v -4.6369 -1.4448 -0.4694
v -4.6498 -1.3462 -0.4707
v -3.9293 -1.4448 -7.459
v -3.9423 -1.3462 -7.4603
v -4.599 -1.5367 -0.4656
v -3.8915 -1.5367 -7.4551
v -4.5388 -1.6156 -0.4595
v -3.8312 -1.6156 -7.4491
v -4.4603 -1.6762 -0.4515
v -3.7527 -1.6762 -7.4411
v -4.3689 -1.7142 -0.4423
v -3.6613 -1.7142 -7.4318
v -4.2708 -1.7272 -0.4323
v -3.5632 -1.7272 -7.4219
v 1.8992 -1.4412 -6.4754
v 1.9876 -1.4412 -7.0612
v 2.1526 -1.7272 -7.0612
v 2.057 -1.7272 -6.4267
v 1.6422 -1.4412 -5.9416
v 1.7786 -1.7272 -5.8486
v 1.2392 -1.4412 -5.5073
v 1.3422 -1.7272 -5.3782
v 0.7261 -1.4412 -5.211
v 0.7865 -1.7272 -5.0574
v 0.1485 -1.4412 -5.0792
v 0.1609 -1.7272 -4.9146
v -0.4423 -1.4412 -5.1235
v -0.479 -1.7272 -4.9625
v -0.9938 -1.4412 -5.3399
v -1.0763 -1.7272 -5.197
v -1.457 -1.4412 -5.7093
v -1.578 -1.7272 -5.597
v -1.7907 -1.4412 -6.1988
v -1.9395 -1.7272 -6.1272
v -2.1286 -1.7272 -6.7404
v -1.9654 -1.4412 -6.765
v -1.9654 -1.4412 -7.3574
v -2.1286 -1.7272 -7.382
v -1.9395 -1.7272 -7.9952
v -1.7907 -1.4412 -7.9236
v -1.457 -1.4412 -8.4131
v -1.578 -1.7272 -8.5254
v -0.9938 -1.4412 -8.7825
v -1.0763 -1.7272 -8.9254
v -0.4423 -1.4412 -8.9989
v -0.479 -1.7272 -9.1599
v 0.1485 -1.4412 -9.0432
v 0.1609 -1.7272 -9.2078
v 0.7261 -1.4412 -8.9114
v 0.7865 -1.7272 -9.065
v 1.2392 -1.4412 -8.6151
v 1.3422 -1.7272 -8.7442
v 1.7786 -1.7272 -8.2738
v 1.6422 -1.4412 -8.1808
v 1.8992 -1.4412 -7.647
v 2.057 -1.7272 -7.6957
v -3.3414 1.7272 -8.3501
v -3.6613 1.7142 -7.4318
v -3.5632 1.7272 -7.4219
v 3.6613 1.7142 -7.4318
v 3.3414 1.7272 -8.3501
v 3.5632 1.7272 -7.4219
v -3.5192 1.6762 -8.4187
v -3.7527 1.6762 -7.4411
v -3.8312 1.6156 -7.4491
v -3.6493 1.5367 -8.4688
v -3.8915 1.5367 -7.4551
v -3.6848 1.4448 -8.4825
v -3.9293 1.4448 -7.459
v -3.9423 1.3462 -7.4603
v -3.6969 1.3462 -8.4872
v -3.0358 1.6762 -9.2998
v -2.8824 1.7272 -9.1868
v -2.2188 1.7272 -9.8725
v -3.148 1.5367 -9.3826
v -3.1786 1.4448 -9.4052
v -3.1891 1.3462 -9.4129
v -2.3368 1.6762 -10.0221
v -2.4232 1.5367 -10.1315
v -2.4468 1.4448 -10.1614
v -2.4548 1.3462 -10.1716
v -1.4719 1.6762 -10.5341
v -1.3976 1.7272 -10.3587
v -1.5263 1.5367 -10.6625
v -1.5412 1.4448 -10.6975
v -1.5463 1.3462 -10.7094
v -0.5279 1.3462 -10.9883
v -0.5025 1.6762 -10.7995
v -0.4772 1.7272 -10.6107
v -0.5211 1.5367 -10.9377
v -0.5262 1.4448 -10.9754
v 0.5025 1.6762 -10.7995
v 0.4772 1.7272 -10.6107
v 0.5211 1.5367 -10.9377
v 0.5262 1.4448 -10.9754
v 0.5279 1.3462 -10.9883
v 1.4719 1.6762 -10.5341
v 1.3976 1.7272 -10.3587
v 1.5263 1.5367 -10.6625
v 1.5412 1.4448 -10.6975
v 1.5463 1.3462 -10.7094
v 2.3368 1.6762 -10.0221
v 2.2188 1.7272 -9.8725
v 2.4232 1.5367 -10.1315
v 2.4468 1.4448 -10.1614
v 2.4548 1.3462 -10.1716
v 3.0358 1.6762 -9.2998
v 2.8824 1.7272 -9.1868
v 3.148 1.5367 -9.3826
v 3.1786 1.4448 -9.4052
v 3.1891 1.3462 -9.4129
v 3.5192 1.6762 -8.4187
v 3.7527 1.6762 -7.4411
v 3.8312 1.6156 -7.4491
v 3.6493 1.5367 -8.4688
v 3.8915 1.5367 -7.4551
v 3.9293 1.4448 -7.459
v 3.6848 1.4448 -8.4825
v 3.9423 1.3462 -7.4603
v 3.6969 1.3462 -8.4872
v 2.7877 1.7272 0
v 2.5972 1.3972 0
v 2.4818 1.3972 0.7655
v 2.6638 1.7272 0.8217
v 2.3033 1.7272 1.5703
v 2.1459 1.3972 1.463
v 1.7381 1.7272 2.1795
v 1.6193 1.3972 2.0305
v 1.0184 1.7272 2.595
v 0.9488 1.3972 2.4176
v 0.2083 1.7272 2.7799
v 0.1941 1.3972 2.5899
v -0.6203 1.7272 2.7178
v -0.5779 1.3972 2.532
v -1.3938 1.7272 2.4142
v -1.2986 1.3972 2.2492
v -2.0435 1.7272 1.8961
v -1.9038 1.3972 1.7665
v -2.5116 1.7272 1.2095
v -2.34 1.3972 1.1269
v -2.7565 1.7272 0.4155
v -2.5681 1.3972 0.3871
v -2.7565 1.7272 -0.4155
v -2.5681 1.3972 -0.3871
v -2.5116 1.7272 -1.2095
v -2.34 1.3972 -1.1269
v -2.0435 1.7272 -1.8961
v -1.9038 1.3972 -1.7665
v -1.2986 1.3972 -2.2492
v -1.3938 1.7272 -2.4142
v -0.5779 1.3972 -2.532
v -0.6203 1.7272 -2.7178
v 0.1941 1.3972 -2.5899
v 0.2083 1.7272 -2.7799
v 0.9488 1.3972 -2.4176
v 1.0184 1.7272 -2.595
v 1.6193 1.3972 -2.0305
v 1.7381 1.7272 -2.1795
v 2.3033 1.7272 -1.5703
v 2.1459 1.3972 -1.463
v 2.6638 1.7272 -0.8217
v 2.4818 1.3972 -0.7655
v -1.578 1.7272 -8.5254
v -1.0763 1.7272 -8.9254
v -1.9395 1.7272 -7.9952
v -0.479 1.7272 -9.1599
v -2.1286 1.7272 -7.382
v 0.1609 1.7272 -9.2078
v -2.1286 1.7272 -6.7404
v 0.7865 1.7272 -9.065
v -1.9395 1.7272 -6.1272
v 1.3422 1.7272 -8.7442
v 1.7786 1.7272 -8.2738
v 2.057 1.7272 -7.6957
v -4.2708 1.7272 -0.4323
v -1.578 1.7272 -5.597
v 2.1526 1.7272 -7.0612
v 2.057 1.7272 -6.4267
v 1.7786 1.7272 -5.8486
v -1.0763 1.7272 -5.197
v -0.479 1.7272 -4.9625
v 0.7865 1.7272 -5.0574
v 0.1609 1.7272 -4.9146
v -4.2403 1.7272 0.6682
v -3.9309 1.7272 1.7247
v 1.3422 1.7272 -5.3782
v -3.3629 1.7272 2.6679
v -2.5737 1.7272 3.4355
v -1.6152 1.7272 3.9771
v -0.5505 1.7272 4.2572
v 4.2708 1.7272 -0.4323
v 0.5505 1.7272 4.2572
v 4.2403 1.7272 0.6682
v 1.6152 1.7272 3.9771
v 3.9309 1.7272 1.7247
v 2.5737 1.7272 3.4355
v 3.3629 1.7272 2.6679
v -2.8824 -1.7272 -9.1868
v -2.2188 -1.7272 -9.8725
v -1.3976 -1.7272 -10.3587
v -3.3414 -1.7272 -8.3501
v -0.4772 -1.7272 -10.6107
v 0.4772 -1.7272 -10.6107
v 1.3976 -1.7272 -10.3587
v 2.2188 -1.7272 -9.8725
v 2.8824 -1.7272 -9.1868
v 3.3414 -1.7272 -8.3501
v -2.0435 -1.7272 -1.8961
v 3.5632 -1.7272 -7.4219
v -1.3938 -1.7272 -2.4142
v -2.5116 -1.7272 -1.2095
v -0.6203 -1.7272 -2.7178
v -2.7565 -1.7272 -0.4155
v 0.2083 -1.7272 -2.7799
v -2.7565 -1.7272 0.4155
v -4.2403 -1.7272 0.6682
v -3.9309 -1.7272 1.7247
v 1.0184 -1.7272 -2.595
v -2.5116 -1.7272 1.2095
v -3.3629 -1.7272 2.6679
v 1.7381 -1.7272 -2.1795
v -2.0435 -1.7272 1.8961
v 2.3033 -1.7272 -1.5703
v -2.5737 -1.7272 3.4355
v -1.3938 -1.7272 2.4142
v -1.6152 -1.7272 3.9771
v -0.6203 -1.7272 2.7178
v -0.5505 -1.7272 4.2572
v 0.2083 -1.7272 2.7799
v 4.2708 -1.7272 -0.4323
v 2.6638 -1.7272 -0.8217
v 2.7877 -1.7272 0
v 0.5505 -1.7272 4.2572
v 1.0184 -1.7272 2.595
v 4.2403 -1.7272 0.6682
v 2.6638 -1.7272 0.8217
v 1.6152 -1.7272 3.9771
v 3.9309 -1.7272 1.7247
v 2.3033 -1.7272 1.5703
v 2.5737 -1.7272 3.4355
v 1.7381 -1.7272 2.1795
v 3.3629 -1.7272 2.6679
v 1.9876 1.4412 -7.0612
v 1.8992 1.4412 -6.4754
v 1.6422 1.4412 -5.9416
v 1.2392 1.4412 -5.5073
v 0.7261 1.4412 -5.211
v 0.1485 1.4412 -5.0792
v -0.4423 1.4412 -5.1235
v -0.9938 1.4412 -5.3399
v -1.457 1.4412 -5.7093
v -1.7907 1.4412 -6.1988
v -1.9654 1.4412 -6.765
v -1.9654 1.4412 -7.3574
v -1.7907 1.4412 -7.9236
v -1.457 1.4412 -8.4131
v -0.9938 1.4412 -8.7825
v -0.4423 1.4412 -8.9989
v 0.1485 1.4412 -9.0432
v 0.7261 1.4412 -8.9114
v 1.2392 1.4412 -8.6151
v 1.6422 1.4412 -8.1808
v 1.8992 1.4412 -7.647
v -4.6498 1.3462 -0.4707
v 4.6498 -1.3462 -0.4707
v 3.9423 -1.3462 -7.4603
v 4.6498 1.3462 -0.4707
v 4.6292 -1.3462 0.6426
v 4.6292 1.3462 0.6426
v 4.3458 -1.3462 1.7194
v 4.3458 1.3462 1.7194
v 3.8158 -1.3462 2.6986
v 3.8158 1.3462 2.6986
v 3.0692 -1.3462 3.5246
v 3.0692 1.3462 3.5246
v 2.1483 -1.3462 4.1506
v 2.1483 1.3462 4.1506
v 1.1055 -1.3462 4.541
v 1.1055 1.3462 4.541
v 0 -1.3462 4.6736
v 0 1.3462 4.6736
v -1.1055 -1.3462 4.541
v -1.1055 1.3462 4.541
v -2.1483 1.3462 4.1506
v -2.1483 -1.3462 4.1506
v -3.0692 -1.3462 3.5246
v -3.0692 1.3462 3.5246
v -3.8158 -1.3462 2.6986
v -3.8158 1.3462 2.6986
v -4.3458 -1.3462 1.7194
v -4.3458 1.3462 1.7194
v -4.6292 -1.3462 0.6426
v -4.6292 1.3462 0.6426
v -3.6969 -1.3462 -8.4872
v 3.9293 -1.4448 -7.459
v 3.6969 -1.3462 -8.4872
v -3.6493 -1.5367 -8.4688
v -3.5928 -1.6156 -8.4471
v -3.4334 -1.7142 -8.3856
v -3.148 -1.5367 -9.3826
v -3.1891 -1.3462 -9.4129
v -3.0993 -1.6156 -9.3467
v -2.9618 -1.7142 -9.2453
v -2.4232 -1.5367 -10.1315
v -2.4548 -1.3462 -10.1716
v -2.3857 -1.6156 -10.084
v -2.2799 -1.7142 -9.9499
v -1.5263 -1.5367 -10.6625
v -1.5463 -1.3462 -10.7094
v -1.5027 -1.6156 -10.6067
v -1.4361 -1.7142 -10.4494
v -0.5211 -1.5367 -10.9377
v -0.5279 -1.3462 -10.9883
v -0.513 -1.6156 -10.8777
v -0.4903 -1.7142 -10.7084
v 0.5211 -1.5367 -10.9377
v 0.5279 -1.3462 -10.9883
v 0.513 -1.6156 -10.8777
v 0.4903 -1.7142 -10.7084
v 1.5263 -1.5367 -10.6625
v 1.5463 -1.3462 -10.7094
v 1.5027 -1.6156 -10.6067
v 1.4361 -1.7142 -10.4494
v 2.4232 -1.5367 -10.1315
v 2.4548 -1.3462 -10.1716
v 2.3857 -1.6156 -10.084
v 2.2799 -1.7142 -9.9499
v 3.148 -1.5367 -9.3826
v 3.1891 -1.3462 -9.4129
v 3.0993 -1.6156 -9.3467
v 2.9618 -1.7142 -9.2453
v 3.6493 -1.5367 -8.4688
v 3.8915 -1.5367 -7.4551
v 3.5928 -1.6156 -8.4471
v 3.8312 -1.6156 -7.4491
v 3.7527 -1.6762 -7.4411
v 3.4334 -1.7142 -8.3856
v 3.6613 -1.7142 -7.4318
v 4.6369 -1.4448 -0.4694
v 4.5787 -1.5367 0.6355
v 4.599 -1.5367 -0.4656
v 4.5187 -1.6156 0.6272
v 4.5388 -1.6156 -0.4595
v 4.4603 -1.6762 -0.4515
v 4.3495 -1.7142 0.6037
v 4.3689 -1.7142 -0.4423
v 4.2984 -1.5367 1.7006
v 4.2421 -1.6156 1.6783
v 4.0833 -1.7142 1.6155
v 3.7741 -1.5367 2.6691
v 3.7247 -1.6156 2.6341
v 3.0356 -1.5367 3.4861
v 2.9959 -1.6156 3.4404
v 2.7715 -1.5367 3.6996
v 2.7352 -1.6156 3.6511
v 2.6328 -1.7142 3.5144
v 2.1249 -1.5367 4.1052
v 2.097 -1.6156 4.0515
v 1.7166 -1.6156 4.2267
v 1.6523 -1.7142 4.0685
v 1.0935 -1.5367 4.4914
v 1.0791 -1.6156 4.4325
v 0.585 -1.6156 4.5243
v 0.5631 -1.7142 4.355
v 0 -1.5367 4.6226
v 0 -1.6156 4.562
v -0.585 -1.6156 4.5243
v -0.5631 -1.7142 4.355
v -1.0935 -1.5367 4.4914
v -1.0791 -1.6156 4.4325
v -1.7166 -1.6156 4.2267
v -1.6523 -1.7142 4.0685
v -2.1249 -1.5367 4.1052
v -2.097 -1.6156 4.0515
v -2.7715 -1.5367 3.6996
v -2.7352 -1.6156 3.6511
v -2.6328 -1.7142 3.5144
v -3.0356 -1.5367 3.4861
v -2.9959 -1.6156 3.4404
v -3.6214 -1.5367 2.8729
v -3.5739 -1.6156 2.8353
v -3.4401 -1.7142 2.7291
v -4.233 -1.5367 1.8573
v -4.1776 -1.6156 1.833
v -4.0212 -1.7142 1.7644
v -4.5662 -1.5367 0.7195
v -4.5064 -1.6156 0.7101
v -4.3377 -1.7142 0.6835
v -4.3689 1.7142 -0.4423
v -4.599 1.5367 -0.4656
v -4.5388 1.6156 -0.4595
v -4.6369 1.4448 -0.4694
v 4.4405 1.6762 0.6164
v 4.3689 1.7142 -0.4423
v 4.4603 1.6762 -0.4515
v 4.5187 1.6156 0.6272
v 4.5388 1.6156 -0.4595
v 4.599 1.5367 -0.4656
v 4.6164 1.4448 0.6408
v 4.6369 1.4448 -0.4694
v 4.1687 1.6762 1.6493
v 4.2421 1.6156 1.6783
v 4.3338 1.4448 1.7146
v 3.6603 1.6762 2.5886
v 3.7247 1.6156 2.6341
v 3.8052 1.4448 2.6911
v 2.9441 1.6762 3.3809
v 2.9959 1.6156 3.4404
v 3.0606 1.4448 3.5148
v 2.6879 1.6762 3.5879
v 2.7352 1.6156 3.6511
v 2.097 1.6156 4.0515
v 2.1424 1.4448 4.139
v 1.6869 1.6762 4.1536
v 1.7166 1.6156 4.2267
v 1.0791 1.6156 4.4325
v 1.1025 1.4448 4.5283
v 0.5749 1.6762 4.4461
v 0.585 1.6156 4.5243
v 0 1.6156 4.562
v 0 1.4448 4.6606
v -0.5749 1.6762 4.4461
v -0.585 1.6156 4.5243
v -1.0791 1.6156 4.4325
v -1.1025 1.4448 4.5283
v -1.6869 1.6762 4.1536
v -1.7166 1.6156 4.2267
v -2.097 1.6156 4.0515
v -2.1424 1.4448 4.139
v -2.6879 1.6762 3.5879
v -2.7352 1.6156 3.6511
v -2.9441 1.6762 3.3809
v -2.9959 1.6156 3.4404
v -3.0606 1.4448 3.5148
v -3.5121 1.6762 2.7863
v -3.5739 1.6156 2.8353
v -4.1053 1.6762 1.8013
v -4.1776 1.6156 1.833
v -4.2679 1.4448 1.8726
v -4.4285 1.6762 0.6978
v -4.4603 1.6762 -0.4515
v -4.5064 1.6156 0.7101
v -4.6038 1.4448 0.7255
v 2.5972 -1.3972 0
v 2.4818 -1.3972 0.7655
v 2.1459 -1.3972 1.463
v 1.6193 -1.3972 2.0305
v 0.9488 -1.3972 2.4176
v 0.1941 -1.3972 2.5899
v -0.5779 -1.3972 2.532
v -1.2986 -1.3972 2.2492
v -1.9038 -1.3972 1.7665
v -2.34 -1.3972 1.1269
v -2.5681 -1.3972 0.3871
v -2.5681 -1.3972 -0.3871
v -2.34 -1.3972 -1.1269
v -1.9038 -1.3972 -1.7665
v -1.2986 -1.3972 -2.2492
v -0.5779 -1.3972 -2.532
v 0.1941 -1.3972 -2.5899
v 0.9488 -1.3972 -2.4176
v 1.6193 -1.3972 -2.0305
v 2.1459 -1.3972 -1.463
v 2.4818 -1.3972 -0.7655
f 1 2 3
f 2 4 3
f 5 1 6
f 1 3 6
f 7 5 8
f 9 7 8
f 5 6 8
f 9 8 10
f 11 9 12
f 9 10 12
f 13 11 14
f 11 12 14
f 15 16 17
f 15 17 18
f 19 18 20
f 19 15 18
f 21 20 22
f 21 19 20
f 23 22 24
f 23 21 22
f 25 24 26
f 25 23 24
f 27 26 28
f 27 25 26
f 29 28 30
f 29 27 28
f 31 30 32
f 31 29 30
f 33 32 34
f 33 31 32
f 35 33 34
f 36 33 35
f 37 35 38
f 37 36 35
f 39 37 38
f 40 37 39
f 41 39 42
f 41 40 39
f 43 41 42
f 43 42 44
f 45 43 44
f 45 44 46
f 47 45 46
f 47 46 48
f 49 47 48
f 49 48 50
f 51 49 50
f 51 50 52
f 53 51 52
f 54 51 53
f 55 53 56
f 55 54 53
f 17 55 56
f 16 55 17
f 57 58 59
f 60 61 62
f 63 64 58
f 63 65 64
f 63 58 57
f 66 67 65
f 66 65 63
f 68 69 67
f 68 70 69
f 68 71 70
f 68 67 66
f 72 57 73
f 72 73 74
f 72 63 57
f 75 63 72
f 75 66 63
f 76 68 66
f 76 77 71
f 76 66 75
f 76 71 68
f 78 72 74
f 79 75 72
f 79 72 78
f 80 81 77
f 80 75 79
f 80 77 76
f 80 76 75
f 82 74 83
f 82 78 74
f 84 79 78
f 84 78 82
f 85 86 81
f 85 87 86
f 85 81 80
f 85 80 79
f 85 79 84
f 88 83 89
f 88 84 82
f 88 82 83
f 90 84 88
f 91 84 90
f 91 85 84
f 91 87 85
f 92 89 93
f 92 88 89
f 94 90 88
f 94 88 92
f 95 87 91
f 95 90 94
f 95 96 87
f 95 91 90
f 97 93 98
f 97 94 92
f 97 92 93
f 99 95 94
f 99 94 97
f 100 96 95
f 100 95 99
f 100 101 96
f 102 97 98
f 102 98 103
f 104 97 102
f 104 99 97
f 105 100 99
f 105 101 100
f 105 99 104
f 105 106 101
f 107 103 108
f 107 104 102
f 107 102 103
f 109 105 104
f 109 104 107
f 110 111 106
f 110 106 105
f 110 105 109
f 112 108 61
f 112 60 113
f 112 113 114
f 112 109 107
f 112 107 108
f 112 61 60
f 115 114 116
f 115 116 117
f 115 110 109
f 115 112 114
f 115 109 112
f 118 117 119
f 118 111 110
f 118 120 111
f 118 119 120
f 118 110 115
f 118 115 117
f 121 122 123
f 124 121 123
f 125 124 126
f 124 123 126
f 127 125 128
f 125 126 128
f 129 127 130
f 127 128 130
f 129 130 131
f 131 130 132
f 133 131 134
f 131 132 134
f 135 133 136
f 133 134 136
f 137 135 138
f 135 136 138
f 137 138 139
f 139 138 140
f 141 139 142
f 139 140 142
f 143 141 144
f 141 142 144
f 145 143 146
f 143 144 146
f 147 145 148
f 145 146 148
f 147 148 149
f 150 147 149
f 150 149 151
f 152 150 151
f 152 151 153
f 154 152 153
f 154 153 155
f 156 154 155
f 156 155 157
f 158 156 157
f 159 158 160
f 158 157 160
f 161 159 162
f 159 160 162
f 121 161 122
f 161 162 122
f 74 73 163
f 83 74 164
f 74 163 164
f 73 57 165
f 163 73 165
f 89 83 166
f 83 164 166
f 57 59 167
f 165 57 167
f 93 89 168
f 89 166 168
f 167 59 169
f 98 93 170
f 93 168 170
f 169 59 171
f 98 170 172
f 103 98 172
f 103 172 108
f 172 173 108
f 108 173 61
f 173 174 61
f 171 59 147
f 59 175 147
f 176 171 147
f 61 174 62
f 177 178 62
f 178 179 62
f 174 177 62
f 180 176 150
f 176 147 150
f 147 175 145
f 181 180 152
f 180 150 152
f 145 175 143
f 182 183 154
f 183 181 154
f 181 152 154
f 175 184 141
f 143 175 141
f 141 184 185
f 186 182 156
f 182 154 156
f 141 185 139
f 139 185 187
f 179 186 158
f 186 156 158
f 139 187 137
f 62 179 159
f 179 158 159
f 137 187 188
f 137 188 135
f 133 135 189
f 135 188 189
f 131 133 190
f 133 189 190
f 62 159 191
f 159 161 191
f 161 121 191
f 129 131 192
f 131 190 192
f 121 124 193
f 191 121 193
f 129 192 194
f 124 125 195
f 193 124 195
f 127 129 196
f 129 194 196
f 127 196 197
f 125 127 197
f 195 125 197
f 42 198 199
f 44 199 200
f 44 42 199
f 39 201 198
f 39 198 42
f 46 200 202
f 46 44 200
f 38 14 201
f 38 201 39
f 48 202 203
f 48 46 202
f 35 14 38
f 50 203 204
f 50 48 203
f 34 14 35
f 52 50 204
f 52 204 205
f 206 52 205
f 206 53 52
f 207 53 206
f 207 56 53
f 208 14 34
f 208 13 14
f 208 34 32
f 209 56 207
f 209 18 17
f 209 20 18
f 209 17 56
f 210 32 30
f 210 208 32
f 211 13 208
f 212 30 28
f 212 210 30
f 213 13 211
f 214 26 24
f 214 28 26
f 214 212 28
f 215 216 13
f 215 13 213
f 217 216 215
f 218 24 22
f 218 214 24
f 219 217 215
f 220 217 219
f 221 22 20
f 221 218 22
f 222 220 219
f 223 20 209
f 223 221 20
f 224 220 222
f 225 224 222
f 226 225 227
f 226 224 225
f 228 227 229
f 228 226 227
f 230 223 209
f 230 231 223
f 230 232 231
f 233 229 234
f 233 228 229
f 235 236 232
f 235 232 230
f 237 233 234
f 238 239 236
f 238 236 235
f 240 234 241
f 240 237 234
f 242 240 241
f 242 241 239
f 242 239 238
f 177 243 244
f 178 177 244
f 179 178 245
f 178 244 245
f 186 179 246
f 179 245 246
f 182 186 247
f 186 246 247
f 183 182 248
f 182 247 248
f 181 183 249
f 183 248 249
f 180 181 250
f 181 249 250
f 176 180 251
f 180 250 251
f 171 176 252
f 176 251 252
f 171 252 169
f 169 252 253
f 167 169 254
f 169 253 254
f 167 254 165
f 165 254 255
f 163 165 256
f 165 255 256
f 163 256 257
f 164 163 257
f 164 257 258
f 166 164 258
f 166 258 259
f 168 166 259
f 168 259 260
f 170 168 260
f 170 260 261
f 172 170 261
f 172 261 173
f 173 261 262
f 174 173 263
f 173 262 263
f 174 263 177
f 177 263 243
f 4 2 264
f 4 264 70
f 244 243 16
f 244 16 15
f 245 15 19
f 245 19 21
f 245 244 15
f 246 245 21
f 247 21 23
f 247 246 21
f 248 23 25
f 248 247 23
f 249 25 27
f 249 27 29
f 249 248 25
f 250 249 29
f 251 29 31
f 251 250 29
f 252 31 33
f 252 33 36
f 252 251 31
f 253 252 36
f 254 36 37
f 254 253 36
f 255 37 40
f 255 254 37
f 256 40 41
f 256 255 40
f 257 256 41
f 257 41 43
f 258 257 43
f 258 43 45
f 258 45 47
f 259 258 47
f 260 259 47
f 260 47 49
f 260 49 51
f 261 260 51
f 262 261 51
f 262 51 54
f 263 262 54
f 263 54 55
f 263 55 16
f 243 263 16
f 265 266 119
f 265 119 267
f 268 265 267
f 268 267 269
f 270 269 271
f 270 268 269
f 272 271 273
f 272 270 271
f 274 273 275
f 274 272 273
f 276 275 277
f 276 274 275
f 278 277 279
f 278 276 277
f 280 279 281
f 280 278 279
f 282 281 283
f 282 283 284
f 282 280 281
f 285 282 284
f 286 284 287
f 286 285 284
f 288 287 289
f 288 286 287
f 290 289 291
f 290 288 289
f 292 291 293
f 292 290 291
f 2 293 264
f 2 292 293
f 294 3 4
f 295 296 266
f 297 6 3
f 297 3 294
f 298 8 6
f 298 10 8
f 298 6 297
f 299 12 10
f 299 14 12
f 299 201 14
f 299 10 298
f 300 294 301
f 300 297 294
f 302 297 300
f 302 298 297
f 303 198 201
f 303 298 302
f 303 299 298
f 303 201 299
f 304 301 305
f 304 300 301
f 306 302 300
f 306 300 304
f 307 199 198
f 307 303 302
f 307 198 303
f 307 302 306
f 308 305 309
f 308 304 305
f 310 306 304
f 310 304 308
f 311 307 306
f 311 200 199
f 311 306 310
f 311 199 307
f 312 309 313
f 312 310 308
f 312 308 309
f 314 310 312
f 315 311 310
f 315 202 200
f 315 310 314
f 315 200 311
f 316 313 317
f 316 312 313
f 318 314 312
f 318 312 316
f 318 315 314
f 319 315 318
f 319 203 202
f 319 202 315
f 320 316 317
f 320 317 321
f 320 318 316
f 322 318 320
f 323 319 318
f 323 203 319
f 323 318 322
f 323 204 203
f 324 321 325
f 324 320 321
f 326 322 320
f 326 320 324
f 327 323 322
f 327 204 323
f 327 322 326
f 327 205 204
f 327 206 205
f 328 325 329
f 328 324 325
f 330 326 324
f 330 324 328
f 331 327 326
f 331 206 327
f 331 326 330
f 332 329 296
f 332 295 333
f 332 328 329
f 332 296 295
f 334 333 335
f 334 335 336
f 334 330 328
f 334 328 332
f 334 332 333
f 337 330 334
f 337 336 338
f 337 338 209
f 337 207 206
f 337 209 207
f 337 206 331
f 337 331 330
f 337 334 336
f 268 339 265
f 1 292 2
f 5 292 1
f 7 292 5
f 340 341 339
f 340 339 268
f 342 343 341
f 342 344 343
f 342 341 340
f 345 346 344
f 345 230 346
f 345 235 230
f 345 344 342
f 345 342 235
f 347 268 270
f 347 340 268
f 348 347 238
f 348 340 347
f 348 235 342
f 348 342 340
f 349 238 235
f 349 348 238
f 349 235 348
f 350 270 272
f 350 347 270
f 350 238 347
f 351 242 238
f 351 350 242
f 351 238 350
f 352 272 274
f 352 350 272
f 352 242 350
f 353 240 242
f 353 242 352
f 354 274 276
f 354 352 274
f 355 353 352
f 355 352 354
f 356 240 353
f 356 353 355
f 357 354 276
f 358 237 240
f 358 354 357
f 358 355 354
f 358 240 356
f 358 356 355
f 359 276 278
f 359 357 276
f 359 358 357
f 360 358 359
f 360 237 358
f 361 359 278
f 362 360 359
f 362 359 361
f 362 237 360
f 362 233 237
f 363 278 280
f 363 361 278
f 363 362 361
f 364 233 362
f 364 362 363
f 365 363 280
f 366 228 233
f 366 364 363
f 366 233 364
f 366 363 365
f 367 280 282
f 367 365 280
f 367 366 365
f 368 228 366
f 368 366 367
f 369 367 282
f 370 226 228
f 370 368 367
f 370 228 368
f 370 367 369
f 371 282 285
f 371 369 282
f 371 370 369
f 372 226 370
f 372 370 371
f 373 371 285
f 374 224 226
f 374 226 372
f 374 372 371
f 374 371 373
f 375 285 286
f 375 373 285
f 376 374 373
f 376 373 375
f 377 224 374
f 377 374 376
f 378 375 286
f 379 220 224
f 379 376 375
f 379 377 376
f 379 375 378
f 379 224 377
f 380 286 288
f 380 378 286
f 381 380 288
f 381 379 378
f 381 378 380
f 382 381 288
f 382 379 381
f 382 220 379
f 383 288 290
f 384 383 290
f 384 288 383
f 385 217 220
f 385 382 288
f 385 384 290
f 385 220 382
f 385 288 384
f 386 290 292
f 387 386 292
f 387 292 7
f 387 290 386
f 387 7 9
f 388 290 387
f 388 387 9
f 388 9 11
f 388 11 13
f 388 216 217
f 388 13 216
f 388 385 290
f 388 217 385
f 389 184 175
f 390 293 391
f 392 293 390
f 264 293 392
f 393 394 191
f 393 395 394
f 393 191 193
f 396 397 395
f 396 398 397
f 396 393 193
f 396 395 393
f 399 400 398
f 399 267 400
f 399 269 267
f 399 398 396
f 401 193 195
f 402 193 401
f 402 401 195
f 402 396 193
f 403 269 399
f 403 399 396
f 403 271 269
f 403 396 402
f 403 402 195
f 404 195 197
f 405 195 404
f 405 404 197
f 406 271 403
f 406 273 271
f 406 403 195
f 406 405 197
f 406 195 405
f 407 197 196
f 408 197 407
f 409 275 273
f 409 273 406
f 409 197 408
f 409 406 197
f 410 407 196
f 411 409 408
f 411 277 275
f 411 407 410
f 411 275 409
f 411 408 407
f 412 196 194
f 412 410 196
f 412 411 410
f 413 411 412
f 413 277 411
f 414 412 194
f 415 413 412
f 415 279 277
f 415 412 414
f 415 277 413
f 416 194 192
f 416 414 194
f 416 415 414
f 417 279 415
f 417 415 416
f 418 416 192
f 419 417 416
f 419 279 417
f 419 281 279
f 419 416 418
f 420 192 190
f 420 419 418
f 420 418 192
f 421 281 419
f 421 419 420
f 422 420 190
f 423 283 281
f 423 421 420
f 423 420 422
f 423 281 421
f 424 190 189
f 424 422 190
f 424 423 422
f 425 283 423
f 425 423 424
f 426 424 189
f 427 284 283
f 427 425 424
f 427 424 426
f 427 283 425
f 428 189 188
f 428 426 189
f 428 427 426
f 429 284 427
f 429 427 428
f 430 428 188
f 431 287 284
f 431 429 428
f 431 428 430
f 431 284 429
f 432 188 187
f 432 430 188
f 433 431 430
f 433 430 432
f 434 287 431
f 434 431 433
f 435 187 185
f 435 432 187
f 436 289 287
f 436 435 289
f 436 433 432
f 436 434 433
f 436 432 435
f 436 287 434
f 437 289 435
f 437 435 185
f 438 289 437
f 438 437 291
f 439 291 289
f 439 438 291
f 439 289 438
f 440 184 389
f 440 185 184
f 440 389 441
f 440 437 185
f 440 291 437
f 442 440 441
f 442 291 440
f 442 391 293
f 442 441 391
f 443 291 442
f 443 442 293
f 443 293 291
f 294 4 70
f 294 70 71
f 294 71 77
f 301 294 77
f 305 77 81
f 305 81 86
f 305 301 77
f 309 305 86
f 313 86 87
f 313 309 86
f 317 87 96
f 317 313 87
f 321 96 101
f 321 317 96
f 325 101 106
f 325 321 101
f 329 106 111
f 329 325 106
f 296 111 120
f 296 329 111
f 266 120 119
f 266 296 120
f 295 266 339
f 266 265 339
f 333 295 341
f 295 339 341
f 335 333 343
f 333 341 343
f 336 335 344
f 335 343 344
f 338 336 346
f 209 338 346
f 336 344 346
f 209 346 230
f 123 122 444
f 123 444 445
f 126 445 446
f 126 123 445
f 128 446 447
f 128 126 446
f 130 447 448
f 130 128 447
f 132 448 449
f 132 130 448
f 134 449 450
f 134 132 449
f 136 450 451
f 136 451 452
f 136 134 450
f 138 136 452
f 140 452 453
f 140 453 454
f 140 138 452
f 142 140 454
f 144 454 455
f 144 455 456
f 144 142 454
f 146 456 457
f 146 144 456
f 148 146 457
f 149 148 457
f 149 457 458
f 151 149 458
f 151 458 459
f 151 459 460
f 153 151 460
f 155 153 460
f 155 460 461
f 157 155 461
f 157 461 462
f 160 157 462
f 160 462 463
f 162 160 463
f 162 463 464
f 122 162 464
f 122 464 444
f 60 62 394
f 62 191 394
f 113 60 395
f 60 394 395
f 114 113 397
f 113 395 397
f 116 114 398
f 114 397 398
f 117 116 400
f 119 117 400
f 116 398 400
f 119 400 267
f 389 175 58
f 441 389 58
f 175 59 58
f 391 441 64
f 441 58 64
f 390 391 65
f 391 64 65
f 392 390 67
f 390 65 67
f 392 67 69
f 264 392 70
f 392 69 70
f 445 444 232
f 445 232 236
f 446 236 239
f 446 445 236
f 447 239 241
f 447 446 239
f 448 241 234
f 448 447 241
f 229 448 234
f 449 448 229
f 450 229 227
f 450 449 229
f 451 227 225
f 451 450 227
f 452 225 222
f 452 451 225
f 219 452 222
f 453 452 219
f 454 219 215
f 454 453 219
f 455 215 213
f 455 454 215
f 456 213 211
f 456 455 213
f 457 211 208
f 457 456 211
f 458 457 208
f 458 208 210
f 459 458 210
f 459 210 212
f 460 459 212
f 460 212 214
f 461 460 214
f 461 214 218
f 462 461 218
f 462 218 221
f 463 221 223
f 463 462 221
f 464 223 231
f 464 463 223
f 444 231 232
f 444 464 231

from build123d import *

# Parameters (mm, degrees)
F0_R       = 1.98755
F0_R_2     = 2.59715
F1_DEPTH   = 1.7272
F2_R       = 0.381
F3_R       = 0.381
F4_SIZE2   = 0.3299556788
F4_SIZE    = 0.1905
F4_2_SIZE2 = 0.3299556788
F4_2_SIZE  = 0.1905
F5_SIZE2   = 0.2859615883
F5_SIZE    = 0.1651
F5_2_SIZE2 = 0.2859615883
F5_2_SIZE  = 0.1651


with BuildPart() as f1:
    # F0 (on Front) → F1 (new body, symmetric)
    with BuildSketch(Plane.XZ):
        with BuildLine():
            ThreePointArc((4.6498341341, -0.4707223022), (0, 4.6736), (-4.6498341341, -0.4707223022))
            Line((-4.6498341341, -0.4707223022), (-3.9422506789, -7.4602906475))
            ThreePointArc((-3.9422506789, -7.4602906475), (0, -11.0236), (3.9422506789, -7.4602906475))
            Line((3.9422506789, -7.4602906475), (4.6498341341, -0.4707223022))
        make_face()
        with Locations((0, -7.0612)):
            Circle(F0_R, mode=Mode.SUBTRACT)
        Circle(F0_R_2, mode=Mode.SUBTRACT)
    extrude(amount=F1_DEPTH, both=True)

    # F2
    f2_edges = [f1.edges().sort_by_distance(p)[0] for p in [
        (4.296042, -1.7272, -3.965506),
        (0, -1.7272, 4.6736),
        (-4.296042, -1.7272, -3.965506),
        (0, -1.7272, -11.0236),
    ]]
    fillet(f2_edges, radius=F2_R)

    # F3
    f3_edges = [f1.edges().sort_by_distance(p)[0] for p in [
        (4.296042, 1.7272, -3.965506),
        (0, 1.7272, 4.6736),
        (-4.296042, 1.7272, -3.965506),
        (0, 1.7272, -11.0236),
    ]]
    fillet(f3_edges, radius=F3_R)

    # F4
    f4_edges = [f1.edges().sort_by_distance(p)[0] for p in [
        (-2.59715, -1.7272, 0),
    ]]
    f4_side = f1.faces().sort_by_distance((0, -1.7272, -3.137355))[0]
    chamfer(f4_edges, length=F4_SIZE, length2=F4_SIZE2, reference=f4_side)

    # F4#2
    f4_2_edges = [f1.edges().sort_by_distance(p)[0] for p in [
        (-2.59715, 1.7272, 0),
    ]]
    f4_2_side = f1.faces().sort_by_distance((0, 1.7272, -3.137355))[0]
    chamfer(f4_2_edges, length=F4_2_SIZE, length2=F4_2_SIZE2, reference=f4_2_side)

    # F5
    f5_edges = [f1.edges().sort_by_distance(p)[0] for p in [
        (-1.98755, -1.7272, -7.0612),
    ]]
    f5_side = f1.faces().sort_by_distance((0, -1.7272, -3.285713))[0]
    chamfer(f5_edges, length=F5_SIZE, length2=F5_SIZE2, reference=f5_side)

    # F5#2
    f5_2_edges = [f1.edges().sort_by_distance(p)[0] for p in [
        (-1.98755, 1.7272, -7.0612),
    ]]
    f5_2_side = f1.faces().sort_by_distance((0, 1.7272, -3.285713))[0]
    chamfer(f5_2_edges, length=F5_2_SIZE, length2=F5_2_SIZE2, reference=f5_2_side)


solid = f1.part
